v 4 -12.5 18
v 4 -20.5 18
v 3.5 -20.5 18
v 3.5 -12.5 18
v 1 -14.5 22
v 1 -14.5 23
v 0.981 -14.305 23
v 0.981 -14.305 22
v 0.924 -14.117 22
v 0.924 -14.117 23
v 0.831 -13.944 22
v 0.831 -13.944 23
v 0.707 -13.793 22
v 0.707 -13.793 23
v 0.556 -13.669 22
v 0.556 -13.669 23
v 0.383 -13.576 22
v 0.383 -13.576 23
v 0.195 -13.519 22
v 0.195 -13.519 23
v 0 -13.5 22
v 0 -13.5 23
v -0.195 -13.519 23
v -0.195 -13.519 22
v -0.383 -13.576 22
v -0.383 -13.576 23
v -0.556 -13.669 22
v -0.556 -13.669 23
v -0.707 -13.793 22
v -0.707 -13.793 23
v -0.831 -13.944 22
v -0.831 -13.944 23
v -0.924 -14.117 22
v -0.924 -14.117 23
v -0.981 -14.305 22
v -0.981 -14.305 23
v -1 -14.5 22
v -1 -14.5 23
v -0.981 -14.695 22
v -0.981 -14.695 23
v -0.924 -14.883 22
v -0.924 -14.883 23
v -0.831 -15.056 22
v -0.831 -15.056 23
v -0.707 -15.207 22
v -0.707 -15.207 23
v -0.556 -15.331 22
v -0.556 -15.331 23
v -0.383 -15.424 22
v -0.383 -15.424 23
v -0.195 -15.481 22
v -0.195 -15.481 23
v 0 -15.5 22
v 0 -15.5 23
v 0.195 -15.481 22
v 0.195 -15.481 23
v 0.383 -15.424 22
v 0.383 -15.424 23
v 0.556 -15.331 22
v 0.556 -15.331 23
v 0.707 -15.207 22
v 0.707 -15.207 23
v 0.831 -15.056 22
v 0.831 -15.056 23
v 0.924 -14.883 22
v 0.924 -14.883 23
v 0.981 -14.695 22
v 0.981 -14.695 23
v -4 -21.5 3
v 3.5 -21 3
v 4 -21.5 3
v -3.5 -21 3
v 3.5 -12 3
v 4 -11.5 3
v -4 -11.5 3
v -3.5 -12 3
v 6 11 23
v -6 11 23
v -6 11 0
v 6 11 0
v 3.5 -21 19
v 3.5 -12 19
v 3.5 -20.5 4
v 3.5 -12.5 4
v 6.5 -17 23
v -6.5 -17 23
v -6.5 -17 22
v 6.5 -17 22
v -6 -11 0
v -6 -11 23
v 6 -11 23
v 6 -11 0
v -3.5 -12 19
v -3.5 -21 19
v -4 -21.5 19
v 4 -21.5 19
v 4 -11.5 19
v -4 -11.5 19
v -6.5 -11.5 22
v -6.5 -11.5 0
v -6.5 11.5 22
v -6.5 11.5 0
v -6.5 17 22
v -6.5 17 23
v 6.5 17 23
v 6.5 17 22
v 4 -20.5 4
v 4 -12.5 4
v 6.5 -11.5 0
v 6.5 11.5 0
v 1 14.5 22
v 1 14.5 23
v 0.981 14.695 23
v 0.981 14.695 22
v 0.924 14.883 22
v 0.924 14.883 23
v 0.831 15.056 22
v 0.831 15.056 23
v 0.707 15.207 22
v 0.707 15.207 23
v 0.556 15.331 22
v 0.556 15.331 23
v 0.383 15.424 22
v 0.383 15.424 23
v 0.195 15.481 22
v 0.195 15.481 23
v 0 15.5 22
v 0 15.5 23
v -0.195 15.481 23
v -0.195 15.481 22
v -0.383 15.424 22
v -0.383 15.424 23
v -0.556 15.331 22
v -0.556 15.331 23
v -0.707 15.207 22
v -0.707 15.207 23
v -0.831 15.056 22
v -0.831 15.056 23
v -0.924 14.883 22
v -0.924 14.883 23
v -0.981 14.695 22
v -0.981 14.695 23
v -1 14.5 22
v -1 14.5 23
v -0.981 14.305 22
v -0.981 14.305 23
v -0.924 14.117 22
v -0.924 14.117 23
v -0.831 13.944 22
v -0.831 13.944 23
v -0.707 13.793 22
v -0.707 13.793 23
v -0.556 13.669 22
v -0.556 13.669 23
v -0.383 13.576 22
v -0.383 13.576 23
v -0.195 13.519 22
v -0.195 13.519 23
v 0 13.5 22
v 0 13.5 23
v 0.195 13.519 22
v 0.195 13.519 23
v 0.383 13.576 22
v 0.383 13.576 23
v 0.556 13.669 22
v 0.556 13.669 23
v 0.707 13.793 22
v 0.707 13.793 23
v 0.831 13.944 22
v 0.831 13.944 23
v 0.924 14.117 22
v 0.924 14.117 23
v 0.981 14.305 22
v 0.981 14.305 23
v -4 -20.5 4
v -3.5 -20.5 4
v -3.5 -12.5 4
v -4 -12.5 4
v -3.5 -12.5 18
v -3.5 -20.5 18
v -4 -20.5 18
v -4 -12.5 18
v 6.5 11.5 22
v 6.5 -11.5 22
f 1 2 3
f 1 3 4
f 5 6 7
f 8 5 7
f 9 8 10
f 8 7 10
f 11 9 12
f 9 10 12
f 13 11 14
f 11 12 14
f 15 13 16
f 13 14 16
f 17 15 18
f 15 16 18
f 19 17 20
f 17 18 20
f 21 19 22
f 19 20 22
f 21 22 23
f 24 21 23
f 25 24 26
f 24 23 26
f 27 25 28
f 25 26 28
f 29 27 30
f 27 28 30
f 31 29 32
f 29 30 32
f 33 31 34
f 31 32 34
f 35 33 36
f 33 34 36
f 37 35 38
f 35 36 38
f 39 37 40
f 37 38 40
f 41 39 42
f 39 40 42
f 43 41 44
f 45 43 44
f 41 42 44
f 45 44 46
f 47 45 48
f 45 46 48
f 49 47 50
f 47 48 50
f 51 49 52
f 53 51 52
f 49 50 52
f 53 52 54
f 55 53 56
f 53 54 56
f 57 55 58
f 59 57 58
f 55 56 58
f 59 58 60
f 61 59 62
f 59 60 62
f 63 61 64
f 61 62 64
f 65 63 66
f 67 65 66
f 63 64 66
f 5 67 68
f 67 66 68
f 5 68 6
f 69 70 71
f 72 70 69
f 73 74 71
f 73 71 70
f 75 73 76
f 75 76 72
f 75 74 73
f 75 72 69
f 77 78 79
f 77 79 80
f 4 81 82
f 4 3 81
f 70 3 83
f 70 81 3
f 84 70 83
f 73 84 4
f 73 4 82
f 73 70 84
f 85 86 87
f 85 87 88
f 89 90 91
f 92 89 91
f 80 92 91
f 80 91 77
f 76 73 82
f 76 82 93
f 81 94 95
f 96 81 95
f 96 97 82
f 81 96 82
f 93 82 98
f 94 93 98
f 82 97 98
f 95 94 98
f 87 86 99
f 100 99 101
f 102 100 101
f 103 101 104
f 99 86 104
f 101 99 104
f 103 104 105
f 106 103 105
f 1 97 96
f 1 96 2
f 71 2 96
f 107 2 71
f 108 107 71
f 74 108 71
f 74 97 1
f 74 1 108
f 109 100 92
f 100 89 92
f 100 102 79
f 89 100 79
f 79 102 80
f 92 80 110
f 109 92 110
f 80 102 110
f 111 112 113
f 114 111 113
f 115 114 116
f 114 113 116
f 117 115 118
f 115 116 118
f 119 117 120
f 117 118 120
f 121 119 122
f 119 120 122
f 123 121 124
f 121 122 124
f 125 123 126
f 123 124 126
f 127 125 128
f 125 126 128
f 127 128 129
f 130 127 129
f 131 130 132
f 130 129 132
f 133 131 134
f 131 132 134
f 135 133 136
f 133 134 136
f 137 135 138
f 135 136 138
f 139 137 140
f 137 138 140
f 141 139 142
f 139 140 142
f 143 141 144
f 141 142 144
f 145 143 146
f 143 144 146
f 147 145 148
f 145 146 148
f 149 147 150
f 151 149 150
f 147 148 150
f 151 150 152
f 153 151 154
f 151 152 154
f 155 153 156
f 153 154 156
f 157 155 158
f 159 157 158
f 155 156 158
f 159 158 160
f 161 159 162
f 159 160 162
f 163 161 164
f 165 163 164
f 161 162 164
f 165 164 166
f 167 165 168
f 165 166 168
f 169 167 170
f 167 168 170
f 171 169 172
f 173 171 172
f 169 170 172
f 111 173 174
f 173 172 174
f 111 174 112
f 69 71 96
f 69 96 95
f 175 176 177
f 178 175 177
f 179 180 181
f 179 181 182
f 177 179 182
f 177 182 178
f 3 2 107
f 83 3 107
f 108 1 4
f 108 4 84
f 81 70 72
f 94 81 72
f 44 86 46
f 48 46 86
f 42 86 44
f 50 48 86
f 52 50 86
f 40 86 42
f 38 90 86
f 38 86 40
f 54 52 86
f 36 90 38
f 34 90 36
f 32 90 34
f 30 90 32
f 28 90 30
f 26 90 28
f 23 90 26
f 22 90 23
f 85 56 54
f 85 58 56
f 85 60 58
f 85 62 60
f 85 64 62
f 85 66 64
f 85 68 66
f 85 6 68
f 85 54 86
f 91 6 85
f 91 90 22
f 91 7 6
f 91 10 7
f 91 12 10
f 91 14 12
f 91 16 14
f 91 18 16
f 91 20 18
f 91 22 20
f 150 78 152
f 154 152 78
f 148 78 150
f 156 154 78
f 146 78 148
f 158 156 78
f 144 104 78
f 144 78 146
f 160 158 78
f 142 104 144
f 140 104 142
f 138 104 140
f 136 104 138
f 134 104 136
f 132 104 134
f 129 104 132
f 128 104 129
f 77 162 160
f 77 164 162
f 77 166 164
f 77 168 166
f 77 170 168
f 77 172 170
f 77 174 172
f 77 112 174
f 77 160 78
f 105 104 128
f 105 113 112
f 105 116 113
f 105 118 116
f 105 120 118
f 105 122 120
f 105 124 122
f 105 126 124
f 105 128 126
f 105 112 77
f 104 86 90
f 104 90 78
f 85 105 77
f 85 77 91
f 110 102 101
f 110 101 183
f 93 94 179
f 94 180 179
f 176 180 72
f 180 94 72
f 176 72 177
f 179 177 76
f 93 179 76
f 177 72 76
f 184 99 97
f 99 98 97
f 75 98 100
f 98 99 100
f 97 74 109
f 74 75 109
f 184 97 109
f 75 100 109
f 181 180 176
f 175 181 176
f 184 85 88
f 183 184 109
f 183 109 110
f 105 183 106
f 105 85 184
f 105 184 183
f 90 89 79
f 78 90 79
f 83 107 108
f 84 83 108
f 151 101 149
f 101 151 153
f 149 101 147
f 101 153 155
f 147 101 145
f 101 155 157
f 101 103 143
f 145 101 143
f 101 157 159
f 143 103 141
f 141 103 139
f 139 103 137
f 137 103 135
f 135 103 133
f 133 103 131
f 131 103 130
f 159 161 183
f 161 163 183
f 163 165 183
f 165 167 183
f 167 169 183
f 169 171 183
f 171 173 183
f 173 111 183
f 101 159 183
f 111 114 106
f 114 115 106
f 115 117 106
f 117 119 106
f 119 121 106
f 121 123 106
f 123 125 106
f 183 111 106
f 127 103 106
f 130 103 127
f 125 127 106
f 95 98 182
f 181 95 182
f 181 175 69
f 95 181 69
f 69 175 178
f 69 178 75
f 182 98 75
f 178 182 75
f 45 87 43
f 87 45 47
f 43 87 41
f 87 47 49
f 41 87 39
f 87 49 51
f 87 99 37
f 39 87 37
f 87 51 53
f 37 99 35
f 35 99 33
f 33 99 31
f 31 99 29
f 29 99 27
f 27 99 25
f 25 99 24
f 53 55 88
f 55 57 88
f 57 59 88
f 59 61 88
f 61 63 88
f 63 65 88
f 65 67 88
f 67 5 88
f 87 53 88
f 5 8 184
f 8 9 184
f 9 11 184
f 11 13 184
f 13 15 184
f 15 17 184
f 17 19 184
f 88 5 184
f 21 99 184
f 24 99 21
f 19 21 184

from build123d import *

# Parameters (mm, degrees)
SKETCH1_W           = 13
SKETCH1_H           = 23
BOSS_EXTRUDE1_DEPTH = 23
CUT_EXTRUDE1_REACH  = 28.524
SKETCH1_3_W         = 12
SKETCH1_3_H         = 22
SKETCH2_W           = 13
SKETCH2_H           = 5.5
SKETCH2_R           = 1
BOSS_EXTRUDE2_DEPTH = 1
SKETCH4_W           = 8
SKETCH4_H           = 16
BOSS_EXTRUDE3_DEPTH = 10
CUT_EXTRUDE2_REACH  = 35.189
SKETCH5_W           = 14
SKETCH5_H           = 8
CUT_EXTRUDE3_REACH  = 32.075
SKETCH6_W           = 7
SKETCH6_H           = 9


with BuildPart() as part:
    # Sketch1 → Boss-Extrude1 (new body)
    with BuildSketch(Plane.XY):
        Rectangle(SKETCH1_W, SKETCH1_H)
    extrude(amount=BOSS_EXTRUDE1_DEPTH)

    # Sketch1<3> → Cut-Extrude1 (cut, up to next)
    with BuildSketch(Plane.XY, mode=Mode.PRIVATE) as cut_extrude1_sk1:
        Rectangle(SKETCH1_3_W, SKETCH1_3_H)
    cut_extrude1_tool1 = extrude(cut_extrude1_sk1.sketch, amount=CUT_EXTRUDE1_REACH, mode=Mode.PRIVATE) & part.part
    add(cut_extrude1_tool1.solids().sort_by_distance((0, 0, 0))[0], mode=Mode.SUBTRACT)

    # Sketch2 → Boss-Extrude2 (add)
    # profile 1 of 2: a face of its own
    with BuildSketch(Plane.XY.offset(23)):
        with Locations((0, 14.25)):
            Rectangle(SKETCH2_W, SKETCH2_H)
        with Locations((0, 14.5)):
            Circle(SKETCH2_R, mode=Mode.SUBTRACT)
    # profile 2 of 2: a face of its own
    with BuildSketch(Plane.XY.offset(23)):
        with Locations((0, -14.25)):
            Rectangle(SKETCH2_W, SKETCH2_H)
        with Locations((0, -14.5)):
            Circle(SKETCH2_R, mode=Mode.SUBTRACT)
    extrude(amount=-BOSS_EXTRUDE2_DEPTH)

    # Sketch4 → Boss-Extrude3 (add)
    with BuildSketch(Plane(origin=(0, -11.5, 0), x_dir=(-1, 0, 0), z_dir=(0, -1, 0))):
        with Locations((0, -11)):
            Rectangle(SKETCH4_W, SKETCH4_H)
    extrude(amount=BOSS_EXTRUDE3_DEPTH)

    # Sketch5 → Cut-Extrude2 (cut, up to next)
    with BuildSketch(Plane(origin=(4, 0, 0), x_dir=(0, 0, -1), z_dir=(1, 0, 0)), mode=Mode.PRIVATE) as cut_extrude2_sk1:
        with Locations((-11, -16.5)):
            Rectangle(SKETCH5_W, SKETCH5_H)
    cut_extrude2_tool1 = extrude(cut_extrude2_sk1.sketch, amount=-CUT_EXTRUDE2_REACH, mode=Mode.PRIVATE) & part.part
    add(cut_extrude2_tool1.solids().sort_by_distance((4, -16.5, 11))[0], mode=Mode.SUBTRACT)

    # Sketch6 → Cut-Extrude3 (cut, up to next)
    with BuildSketch(Plane(origin=(0, 0, 3), x_dir=(-1, 0, 0), z_dir=(0, 0, -1)), mode=Mode.PRIVATE) as cut_extrude3_sk1:
        with Locations((0, -16.5)):
            Rectangle(SKETCH6_W, SKETCH6_H)
    cut_extrude3_tool1 = extrude(cut_extrude3_sk1.sketch, amount=-CUT_EXTRUDE3_REACH, mode=Mode.PRIVATE) & part.part
    add(cut_extrude3_tool1.solids().sort_by_distance((0, -16.5, 3))[0], mode=Mode.SUBTRACT)


solid = part.part
